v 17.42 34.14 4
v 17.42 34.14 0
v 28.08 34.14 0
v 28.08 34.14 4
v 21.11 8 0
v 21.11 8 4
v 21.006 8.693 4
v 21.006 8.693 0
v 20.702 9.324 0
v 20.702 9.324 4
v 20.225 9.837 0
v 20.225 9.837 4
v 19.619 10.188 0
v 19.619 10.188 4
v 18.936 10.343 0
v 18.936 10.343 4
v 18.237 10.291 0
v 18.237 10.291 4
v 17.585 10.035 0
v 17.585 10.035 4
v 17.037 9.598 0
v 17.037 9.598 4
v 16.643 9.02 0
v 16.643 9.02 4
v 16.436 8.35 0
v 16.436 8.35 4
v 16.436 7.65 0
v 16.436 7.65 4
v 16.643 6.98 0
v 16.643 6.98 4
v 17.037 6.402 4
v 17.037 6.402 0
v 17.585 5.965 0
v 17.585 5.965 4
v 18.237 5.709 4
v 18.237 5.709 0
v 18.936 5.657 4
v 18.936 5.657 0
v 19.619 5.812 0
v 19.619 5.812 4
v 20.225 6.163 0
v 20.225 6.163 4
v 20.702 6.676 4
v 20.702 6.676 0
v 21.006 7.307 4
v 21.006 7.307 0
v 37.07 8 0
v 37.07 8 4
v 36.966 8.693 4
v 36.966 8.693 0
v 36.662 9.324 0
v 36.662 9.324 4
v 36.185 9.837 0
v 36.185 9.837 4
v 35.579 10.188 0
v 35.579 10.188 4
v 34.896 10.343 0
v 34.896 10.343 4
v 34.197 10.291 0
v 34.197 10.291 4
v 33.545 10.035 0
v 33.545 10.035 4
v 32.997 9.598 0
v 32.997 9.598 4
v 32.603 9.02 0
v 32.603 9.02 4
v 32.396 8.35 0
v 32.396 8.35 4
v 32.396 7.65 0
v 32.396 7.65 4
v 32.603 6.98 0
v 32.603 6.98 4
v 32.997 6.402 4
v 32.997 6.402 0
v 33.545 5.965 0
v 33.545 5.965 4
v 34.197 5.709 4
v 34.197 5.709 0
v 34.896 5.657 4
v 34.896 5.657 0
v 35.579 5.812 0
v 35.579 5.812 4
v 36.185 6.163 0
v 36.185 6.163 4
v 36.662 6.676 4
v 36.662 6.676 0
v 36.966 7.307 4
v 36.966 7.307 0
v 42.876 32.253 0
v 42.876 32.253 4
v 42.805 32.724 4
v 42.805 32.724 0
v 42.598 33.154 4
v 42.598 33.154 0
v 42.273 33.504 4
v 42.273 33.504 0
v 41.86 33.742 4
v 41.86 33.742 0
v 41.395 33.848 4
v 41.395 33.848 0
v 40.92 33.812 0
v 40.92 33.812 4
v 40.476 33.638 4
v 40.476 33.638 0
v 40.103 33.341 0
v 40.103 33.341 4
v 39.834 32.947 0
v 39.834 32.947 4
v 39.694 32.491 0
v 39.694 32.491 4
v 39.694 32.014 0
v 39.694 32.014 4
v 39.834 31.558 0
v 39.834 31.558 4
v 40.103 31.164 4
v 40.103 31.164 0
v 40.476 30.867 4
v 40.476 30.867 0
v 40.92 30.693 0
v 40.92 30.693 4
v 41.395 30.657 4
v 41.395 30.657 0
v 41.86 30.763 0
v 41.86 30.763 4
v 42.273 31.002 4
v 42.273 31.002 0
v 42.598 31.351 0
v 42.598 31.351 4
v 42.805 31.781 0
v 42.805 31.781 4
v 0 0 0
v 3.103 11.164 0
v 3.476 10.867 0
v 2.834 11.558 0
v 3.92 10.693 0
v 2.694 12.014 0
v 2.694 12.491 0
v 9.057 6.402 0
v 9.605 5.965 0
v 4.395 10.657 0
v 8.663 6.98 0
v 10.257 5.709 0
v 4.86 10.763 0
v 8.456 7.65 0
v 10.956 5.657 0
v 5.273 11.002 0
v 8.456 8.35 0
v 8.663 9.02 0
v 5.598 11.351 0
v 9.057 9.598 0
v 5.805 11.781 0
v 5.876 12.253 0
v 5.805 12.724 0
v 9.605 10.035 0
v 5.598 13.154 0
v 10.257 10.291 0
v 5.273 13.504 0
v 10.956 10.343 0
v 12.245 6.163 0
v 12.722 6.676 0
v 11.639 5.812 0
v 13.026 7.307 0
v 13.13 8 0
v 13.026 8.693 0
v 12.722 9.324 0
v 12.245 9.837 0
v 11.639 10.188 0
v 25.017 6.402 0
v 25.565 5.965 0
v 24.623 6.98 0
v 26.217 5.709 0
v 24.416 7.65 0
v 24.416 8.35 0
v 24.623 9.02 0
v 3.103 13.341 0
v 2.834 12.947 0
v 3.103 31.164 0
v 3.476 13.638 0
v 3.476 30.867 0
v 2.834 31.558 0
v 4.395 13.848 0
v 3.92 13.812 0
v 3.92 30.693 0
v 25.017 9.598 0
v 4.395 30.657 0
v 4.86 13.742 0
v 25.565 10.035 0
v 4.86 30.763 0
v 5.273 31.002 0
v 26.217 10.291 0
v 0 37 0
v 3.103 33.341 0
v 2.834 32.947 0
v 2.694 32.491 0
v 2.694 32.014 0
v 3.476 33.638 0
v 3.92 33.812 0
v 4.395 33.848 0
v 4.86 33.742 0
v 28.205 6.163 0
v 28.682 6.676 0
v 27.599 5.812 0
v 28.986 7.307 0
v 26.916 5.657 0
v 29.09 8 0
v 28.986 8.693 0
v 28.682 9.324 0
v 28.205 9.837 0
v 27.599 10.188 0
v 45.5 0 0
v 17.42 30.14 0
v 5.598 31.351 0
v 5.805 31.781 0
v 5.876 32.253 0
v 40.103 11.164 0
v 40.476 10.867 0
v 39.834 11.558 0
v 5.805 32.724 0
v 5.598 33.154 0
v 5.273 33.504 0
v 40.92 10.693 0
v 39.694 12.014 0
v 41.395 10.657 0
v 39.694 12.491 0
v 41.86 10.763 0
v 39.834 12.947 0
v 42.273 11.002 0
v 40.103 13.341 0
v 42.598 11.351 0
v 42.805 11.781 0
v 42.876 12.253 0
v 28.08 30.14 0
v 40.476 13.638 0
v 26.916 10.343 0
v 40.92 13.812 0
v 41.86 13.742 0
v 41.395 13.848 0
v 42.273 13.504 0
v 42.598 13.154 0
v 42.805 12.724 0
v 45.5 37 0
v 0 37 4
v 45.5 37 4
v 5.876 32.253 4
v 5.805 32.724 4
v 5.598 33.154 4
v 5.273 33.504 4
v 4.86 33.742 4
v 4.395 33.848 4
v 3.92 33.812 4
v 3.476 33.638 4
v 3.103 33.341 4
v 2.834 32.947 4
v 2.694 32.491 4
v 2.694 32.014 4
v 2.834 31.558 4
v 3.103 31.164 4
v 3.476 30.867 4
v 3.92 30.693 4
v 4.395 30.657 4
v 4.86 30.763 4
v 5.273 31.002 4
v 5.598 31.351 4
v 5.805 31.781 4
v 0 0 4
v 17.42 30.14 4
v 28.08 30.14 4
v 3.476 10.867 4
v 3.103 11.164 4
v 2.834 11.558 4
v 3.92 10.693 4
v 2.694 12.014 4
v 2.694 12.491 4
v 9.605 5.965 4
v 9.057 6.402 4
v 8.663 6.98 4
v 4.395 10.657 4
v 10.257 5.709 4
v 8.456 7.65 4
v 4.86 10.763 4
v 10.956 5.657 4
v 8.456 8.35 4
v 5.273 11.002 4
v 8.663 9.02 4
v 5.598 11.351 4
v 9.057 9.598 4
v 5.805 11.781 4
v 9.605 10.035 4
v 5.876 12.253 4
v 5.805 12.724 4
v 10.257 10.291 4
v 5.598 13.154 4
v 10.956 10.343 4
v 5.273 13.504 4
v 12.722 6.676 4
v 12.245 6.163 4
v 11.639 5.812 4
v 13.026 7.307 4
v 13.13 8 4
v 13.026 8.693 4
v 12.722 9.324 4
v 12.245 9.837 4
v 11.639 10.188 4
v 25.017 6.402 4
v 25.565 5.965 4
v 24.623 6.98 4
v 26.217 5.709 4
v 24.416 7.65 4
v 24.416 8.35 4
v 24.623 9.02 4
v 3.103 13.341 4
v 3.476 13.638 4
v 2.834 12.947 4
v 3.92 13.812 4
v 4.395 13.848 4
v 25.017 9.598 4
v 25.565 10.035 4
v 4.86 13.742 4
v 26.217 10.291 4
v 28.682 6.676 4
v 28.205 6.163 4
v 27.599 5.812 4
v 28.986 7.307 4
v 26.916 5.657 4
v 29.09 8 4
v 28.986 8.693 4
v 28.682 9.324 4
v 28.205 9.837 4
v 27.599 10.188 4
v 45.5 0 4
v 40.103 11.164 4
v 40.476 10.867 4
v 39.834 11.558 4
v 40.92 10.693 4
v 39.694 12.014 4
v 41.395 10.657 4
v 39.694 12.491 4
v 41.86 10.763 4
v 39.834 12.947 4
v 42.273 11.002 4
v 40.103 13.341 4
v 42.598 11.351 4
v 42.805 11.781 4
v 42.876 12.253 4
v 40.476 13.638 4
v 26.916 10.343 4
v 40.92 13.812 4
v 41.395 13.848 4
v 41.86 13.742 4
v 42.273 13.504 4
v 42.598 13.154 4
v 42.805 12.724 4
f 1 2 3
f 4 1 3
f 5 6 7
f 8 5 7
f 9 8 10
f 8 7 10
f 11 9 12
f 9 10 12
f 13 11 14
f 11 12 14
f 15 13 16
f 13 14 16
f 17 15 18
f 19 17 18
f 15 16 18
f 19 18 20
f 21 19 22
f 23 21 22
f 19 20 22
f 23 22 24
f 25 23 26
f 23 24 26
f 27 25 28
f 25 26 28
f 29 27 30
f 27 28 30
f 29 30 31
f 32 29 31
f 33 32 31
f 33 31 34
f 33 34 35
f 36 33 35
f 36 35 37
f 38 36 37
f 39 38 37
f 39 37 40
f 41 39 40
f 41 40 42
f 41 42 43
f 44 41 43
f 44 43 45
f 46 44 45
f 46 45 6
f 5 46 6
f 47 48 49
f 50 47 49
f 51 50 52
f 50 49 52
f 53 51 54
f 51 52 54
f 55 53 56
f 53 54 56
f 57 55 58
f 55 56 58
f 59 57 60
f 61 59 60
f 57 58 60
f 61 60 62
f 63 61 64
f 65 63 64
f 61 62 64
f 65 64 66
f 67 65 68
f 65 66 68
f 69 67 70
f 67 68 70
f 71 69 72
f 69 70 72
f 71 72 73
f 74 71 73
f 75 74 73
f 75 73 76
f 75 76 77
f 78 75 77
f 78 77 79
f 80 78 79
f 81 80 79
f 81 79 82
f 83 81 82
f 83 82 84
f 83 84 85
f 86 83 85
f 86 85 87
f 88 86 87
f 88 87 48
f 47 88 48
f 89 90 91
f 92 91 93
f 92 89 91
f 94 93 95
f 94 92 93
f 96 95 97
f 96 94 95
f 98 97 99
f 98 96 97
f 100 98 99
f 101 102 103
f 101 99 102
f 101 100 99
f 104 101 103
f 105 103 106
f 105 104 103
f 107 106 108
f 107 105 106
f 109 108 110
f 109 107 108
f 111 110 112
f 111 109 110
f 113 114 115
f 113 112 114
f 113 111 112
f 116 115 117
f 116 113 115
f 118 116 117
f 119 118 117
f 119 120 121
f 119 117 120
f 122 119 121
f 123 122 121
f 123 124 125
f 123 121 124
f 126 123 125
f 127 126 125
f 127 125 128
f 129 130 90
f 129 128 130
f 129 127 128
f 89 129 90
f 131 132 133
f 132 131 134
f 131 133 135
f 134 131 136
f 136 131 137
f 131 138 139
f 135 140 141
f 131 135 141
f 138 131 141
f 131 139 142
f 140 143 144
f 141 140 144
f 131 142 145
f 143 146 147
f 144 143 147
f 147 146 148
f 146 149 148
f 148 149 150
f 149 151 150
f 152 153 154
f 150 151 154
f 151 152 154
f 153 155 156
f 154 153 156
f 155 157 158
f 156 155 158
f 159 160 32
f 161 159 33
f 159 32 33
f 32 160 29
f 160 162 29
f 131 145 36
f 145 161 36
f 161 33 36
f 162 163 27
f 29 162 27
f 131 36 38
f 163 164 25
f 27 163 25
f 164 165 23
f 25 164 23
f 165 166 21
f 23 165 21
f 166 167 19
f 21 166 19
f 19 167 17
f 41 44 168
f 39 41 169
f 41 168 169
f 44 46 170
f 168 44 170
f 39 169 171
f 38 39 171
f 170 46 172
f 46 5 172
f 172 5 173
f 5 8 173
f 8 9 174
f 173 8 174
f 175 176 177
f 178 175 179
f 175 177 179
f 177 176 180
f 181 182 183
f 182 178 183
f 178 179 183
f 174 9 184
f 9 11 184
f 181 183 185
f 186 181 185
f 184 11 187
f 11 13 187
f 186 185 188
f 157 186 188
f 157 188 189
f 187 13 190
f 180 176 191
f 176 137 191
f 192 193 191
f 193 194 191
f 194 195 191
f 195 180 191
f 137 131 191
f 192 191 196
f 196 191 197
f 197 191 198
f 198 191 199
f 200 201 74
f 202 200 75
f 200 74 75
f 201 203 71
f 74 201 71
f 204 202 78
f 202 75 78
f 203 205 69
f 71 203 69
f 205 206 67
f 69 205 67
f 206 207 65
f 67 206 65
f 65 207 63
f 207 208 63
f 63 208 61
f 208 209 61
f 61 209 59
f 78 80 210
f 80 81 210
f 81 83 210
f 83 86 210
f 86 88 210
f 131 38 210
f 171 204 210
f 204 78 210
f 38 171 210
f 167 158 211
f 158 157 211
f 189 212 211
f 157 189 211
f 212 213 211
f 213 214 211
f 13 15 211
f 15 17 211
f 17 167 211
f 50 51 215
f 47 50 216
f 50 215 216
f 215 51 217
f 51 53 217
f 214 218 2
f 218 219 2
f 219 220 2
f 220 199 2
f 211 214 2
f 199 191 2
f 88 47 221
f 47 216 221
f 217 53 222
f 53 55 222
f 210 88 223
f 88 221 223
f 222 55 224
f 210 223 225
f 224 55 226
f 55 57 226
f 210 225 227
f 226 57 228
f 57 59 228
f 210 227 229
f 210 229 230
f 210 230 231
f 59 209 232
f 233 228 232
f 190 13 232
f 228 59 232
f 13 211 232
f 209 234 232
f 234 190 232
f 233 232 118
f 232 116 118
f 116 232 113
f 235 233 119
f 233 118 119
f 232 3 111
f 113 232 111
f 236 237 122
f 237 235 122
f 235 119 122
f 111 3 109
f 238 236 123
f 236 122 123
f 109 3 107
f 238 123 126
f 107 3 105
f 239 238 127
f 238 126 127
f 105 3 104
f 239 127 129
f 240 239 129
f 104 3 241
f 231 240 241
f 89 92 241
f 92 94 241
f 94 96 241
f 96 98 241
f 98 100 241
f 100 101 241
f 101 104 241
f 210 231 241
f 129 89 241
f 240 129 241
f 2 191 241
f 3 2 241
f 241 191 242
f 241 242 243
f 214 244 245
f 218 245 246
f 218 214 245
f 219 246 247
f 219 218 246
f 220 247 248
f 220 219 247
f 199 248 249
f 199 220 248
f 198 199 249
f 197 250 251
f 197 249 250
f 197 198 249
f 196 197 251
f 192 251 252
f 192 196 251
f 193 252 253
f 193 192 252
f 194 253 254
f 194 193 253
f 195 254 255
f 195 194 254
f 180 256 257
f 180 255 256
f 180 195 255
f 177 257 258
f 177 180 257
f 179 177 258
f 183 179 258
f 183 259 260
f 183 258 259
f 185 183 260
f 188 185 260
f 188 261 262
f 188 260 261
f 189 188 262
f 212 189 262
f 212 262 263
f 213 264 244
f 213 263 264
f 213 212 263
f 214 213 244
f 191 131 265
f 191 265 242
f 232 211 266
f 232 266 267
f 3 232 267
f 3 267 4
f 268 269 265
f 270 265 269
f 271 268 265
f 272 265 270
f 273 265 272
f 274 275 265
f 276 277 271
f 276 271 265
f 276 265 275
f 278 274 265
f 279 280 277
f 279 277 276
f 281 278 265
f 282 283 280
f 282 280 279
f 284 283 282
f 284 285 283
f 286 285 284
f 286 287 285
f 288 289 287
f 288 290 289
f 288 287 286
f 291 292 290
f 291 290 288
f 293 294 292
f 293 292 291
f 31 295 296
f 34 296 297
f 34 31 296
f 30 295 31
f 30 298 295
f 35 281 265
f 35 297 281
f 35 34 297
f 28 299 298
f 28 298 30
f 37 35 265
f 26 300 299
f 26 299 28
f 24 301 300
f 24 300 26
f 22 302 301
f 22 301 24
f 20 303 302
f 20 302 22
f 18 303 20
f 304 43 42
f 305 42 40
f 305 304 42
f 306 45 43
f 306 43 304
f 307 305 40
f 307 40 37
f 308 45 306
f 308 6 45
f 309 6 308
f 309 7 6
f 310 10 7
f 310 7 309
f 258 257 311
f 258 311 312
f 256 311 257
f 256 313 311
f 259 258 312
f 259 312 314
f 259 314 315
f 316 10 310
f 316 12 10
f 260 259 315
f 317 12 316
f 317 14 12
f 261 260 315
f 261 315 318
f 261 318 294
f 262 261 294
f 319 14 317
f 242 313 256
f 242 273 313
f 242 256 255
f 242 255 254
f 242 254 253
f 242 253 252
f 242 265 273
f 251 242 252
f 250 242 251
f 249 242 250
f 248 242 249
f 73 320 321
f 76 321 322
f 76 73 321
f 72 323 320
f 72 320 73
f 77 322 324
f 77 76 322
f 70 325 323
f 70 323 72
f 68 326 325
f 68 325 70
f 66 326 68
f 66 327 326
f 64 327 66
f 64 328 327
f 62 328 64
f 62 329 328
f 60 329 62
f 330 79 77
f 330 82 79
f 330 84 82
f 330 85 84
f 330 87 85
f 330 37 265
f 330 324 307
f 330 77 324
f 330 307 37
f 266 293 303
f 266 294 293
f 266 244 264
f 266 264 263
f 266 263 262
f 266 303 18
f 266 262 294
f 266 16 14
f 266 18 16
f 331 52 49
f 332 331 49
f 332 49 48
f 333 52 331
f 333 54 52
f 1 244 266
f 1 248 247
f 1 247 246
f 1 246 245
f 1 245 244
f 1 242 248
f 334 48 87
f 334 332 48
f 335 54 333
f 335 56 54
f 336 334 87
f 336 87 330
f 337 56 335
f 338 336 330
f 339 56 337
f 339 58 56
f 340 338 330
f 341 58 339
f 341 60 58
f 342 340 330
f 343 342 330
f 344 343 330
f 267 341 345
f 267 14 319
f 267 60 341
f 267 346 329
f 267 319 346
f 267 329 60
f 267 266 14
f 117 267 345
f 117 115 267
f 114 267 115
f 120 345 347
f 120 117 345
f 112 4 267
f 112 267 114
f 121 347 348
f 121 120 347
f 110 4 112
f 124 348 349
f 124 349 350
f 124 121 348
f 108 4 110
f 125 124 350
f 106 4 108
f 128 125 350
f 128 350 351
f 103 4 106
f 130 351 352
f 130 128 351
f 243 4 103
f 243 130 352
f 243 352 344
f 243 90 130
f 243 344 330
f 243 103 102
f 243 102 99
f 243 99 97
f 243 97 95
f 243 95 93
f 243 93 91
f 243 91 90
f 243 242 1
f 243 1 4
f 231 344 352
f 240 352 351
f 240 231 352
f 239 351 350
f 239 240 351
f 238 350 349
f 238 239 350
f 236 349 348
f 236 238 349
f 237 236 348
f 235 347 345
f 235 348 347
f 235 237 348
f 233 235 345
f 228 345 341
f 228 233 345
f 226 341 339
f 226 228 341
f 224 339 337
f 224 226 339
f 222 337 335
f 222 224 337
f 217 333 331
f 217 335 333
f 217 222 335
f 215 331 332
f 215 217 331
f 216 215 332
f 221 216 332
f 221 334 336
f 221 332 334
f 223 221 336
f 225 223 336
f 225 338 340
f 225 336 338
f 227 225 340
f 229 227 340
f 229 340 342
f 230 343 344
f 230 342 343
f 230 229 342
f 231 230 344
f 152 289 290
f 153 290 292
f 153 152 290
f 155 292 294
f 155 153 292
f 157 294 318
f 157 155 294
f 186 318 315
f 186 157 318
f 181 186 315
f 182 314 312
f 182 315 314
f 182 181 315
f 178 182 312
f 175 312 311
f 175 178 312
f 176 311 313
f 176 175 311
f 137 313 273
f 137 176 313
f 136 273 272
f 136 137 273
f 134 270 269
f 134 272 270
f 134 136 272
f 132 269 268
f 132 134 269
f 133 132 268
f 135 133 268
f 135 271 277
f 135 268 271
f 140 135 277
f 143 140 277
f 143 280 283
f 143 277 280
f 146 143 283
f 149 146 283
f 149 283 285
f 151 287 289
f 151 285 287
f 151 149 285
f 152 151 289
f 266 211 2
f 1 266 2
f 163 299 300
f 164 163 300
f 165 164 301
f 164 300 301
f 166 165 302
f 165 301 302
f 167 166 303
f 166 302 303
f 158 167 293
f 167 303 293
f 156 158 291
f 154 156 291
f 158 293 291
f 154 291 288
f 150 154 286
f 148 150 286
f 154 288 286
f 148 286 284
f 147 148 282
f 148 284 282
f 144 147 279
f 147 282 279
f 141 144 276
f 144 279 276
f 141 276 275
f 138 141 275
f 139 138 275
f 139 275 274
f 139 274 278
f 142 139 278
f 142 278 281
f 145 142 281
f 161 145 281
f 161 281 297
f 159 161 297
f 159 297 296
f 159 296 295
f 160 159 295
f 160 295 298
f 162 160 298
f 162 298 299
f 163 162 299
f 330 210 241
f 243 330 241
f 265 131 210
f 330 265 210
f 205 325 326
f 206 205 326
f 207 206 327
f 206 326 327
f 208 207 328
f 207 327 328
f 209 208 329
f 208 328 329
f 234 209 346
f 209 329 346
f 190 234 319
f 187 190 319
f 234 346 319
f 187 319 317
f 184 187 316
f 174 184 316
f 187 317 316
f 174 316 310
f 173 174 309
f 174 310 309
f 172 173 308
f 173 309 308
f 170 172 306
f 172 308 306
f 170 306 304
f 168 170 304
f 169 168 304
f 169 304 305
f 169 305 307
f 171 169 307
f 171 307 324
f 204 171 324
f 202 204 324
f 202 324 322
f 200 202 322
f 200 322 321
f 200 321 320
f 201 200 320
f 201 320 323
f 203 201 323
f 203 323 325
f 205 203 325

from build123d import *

# Parameters (mm, degrees)
SKETCH1_W               = 45.5
SKETCH1_H               = 37
SKETCH1_W_2             = 10.66
SKETCH1_H_2             = 4
BOSS_EXTRUDE1_DEPTH     = 4
SKETCH3_R               = 1.6
CUT_EXTRUDE5_DEPTH      = 10
CUT_EXTRUDE5_DEPTH_BACK = 1
SKETCH4_R               = 2.35
LEGO_GATEN_DEPTH        = 10


with BuildPart() as part:
    # Sketch1 → Boss-Extrude1 (new body)
    with BuildSketch(Plane.XY):
        with Locations((22.75, 18.5)):
            Rectangle(SKETCH1_W, SKETCH1_H)
        with Locations((22.75, 32.14)):
            Rectangle(SKETCH1_W_2, SKETCH1_H_2, mode=Mode.SUBTRACT)
    extrude(amount=BOSS_EXTRUDE1_DEPTH)

    # Sketch3 → Cut-Extrude5 (cut, two sides)
    with BuildSketch(Plane.XY) as cut_extrude5_sk:
        with Locations((41.27584891, 32.252592082)):
            Circle(SKETCH3_R)
        with Locations((41.27584891, 12.252592082)):
            Circle(SKETCH3_R)
        with Locations((4.27584891, 12.252592082)):
            Circle(SKETCH3_R)
        with Locations((4.27584891, 32.252592082)):
            Circle(SKETCH3_R)
    extrude(amount=CUT_EXTRUDE5_DEPTH, mode=Mode.SUBTRACT)
    extrude(cut_extrude5_sk.sketch, amount=-CUT_EXTRUDE5_DEPTH_BACK, mode=Mode.SUBTRACT)

    # Sketch4 → Lego gaten (cut)
    with BuildSketch(Plane.XY.offset(4)):
        with Locations((10.78, 8)):
            Circle(SKETCH4_R)
        with Locations((18.76, 8)):
            Circle(SKETCH4_R)
        with Locations((26.74, 8)):
            Circle(SKETCH4_R)
        with Locations((34.72, 8)):
            Circle(SKETCH4_R)
    extrude(amount=-LEGO_GATEN_DEPTH, mode=Mode.SUBTRACT)


solid = part.part
